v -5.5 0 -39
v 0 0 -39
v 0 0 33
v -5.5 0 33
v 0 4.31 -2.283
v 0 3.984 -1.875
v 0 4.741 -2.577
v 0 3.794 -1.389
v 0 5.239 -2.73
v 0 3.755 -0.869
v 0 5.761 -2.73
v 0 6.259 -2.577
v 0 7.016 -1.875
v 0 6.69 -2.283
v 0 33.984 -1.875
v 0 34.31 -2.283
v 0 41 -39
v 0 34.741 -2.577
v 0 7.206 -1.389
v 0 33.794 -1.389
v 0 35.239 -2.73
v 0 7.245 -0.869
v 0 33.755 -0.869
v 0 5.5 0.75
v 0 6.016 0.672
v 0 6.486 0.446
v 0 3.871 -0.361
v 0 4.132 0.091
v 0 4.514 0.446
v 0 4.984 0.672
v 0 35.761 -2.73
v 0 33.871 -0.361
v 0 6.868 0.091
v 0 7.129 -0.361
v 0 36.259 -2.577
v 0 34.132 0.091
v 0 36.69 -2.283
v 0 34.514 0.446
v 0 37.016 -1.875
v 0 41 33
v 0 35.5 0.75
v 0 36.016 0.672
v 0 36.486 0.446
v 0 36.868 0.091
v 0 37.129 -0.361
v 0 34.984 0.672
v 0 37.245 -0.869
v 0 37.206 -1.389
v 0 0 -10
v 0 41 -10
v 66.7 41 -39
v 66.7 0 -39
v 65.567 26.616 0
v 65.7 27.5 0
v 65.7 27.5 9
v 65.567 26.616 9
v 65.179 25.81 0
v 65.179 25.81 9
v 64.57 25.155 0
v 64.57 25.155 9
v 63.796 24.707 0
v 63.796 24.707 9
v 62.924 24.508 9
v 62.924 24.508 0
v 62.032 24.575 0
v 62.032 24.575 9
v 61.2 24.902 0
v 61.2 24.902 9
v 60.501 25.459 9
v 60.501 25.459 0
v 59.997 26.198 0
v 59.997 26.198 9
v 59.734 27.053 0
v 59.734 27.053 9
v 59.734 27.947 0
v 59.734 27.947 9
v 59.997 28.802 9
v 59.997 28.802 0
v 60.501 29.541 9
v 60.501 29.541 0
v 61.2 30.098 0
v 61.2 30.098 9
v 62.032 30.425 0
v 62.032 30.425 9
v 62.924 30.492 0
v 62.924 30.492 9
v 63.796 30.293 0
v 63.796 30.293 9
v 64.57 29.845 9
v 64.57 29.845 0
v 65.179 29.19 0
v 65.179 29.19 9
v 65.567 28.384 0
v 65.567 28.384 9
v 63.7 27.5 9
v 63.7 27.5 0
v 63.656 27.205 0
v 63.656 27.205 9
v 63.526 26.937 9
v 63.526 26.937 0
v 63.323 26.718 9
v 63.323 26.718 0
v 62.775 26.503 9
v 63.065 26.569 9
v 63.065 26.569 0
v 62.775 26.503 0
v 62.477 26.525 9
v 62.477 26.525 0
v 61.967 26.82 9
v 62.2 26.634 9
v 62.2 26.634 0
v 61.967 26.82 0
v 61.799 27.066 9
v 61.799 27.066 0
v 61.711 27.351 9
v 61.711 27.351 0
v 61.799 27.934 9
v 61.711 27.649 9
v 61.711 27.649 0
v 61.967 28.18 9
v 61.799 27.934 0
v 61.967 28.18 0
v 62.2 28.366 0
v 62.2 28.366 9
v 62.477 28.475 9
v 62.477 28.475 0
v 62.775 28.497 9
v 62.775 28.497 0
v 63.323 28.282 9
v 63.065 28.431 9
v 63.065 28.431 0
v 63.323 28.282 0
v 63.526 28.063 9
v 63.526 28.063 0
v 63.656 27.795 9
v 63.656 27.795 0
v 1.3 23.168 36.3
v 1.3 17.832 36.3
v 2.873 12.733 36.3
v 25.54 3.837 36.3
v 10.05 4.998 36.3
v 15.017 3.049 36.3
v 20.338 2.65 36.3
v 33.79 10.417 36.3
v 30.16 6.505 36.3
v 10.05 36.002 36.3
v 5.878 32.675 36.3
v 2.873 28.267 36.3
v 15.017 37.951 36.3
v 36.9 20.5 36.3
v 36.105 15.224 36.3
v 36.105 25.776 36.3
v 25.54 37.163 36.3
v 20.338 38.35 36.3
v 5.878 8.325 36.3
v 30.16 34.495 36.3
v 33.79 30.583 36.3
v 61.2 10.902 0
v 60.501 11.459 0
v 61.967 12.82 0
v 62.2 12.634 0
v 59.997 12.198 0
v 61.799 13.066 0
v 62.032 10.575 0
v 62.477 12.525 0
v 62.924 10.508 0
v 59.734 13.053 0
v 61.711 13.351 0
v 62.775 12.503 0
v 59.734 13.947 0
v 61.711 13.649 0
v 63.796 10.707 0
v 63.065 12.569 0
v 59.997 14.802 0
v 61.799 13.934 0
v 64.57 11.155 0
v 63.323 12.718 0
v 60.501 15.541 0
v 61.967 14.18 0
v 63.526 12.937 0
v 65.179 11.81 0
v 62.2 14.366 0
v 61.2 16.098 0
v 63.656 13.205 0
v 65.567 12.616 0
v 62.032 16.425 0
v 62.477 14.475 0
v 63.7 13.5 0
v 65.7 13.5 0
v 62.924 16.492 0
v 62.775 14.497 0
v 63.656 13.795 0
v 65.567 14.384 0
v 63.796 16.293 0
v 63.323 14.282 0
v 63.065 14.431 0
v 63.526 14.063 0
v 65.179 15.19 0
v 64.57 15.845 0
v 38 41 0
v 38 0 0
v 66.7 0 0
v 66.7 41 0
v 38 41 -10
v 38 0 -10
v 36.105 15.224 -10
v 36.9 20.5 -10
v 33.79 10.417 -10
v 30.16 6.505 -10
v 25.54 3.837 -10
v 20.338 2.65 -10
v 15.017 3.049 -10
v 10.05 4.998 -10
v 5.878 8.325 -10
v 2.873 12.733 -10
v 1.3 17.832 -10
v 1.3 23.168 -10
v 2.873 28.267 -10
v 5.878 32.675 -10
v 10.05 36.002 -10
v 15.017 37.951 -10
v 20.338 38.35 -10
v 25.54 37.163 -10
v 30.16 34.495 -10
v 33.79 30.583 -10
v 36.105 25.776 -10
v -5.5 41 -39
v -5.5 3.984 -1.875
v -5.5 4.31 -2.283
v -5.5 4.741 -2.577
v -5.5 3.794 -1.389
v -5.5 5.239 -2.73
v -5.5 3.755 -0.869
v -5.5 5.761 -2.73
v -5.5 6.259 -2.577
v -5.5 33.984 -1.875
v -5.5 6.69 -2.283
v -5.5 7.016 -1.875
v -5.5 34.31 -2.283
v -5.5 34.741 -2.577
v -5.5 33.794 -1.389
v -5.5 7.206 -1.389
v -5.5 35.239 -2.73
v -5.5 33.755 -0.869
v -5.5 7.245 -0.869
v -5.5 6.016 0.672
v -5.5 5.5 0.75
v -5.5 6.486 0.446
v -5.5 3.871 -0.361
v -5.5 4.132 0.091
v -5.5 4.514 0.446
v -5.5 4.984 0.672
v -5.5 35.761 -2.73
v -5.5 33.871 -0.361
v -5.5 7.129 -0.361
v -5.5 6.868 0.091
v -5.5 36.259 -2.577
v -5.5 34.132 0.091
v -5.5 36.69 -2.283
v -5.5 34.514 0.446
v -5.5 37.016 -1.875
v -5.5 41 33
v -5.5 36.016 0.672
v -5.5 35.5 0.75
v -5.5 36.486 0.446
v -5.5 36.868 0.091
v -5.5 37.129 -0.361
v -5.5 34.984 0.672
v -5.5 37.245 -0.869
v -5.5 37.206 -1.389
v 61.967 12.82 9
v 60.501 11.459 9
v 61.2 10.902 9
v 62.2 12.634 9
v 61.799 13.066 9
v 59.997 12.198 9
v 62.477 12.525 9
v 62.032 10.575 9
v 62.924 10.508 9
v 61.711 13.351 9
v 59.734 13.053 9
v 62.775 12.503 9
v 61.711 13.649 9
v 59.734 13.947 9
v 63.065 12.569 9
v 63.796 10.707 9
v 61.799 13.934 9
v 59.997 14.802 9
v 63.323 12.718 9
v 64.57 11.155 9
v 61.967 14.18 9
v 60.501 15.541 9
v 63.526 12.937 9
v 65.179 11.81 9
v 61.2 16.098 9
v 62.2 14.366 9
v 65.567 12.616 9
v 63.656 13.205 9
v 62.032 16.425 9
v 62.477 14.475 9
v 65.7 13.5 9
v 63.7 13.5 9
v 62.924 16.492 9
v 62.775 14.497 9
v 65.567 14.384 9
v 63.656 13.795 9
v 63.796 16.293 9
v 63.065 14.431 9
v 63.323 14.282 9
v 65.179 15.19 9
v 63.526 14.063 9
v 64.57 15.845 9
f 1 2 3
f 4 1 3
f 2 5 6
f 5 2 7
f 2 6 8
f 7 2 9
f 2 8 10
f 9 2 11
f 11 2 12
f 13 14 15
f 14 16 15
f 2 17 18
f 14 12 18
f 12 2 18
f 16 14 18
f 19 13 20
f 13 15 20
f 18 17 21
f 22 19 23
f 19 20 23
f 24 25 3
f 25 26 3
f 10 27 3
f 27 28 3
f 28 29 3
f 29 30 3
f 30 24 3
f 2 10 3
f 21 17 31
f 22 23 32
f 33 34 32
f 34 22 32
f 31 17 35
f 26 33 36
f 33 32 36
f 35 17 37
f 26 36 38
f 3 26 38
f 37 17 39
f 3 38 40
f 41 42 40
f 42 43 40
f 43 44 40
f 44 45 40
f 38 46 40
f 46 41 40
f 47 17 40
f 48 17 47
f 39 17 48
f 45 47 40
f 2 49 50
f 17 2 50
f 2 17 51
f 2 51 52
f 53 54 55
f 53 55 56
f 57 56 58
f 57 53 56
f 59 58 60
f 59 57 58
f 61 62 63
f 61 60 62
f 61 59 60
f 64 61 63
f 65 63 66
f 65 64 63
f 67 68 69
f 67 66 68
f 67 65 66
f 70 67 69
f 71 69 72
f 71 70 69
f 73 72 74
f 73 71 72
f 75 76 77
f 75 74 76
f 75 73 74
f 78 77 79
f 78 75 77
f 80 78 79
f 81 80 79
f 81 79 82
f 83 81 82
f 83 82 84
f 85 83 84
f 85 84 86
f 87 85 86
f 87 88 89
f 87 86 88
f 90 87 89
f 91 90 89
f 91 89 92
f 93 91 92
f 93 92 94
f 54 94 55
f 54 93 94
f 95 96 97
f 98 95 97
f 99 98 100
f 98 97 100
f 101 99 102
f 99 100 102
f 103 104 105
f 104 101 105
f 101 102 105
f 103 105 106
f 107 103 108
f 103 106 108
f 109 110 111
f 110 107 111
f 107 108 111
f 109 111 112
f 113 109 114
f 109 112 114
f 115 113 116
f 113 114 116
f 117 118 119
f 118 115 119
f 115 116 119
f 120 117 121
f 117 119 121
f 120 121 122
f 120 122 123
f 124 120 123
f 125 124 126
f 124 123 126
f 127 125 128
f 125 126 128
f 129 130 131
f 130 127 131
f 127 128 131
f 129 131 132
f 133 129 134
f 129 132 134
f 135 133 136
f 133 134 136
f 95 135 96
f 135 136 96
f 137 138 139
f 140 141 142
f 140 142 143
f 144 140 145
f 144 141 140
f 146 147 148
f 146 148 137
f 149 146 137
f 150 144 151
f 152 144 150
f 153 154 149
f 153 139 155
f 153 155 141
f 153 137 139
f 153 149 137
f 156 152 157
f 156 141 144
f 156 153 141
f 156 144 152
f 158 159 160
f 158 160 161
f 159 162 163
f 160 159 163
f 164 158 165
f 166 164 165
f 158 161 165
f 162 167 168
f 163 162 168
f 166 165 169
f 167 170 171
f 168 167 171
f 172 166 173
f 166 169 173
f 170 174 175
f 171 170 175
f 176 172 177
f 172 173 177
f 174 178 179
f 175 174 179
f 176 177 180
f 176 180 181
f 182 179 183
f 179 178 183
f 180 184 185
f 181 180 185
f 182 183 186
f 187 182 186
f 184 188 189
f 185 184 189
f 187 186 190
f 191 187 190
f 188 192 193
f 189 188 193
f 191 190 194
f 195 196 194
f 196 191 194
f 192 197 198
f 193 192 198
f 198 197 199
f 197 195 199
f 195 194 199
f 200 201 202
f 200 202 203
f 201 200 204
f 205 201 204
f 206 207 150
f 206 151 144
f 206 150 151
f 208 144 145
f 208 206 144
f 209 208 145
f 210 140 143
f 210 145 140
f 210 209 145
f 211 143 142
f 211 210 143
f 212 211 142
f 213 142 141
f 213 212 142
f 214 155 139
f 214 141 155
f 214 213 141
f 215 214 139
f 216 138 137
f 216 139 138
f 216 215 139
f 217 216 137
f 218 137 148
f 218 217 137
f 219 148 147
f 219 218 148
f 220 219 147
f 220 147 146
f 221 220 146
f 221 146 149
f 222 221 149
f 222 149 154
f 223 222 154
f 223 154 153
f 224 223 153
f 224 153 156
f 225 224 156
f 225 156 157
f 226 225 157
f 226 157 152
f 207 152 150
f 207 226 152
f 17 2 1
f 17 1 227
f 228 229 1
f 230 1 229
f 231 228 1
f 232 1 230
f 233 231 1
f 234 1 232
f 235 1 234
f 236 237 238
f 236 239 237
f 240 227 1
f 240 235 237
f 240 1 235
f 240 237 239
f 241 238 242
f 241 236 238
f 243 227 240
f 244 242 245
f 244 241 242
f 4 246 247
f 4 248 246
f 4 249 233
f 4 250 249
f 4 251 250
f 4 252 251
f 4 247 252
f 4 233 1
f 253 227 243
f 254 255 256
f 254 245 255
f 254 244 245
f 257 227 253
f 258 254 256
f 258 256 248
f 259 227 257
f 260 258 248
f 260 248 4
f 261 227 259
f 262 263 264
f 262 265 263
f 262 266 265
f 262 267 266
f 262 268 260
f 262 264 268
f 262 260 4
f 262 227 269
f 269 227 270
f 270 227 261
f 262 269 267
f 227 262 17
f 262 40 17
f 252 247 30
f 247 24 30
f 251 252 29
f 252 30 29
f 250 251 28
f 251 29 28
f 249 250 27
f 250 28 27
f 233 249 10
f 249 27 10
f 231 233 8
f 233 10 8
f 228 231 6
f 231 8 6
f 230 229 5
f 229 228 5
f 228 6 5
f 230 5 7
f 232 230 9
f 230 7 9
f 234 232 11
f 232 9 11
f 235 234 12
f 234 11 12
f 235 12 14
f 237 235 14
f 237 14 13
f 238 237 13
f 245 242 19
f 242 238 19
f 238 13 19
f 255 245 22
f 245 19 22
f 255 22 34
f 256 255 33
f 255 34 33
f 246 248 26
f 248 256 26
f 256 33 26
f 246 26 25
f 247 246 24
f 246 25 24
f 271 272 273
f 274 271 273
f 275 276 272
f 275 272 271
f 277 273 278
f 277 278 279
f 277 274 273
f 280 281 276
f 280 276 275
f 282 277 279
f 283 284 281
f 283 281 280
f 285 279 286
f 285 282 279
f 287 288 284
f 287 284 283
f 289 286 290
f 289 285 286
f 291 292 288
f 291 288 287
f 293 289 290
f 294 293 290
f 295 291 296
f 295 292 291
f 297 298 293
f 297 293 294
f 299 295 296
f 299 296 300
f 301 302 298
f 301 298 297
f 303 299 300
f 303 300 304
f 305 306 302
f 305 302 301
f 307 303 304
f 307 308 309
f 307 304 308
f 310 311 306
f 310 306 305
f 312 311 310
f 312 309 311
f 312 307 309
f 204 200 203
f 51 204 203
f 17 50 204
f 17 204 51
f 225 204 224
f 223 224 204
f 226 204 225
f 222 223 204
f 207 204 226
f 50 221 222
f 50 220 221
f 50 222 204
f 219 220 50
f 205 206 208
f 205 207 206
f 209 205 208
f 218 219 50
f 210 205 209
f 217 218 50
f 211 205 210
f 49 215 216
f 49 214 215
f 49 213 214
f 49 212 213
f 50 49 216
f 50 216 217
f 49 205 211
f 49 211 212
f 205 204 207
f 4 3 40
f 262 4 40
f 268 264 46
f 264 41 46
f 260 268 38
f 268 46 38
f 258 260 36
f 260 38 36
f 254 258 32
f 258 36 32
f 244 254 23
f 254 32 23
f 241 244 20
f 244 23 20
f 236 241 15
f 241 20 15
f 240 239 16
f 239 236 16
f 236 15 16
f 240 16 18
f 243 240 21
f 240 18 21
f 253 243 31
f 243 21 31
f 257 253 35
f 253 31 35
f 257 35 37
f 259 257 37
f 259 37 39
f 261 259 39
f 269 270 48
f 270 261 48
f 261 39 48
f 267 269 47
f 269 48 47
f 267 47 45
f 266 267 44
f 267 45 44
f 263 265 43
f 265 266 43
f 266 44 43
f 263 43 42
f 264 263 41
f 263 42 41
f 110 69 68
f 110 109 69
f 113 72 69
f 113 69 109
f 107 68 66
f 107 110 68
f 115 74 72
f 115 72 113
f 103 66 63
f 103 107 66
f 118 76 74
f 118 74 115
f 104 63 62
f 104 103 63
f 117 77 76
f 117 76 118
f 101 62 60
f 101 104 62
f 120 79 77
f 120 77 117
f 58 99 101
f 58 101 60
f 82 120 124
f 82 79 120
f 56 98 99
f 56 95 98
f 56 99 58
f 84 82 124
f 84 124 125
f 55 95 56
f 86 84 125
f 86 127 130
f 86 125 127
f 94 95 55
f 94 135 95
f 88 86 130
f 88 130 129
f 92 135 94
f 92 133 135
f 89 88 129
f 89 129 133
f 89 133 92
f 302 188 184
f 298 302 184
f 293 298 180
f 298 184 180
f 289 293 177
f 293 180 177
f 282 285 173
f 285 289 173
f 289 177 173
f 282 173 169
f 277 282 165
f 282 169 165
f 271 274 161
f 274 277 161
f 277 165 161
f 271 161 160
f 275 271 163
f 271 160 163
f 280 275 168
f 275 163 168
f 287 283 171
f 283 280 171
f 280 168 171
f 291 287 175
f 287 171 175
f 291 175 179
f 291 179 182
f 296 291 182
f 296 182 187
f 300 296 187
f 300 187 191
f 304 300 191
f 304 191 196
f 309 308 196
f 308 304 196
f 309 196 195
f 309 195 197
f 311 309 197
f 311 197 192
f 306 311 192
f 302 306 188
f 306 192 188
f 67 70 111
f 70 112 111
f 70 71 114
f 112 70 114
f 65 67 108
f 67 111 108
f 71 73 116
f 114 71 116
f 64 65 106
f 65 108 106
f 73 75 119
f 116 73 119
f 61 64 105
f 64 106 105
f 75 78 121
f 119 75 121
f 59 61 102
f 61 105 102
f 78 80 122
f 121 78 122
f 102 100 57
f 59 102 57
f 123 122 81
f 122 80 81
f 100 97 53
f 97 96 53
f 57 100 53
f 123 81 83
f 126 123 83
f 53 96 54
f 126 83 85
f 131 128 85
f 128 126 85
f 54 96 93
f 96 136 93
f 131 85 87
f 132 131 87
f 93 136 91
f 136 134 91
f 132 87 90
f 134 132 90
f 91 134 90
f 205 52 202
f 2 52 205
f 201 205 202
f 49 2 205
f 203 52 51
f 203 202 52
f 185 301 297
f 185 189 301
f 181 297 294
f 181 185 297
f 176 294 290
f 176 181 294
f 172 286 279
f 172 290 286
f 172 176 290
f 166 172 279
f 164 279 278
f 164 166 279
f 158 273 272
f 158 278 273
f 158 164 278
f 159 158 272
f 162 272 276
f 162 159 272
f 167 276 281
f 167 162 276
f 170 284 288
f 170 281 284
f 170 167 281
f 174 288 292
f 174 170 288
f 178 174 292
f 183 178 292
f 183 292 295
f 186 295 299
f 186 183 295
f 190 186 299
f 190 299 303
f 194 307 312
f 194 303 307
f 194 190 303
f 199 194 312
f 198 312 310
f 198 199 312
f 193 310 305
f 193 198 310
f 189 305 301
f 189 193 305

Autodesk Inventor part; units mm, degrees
ref_plane "YZ Plane" through (0, 0, 0) normal (1, 0, 0) x (0, 1, 0)
ref_plane "XZ Plane" through (0, 0, 0) normal (0, 1, 0) x (-1, 0, 0)
ref_plane "XY Plane" through (0, 0, 0) normal (0, 0, 1) x (1, 0, 0)
sketch "スケッチ1" plane through (0, 0, 0) normal (1, 0, 0) x (0, 1, 0)
  line L0 (0, 0) -> (41, 0)
  line L1 (41, 0) -> (41, -39)
  line L2 (41, -39) -> (0, -39)
  line L3 (0, -39) -> (0, 0)
  dimension "d0" = 41
  dimension "d1" = 39
extrude "押し出し1" add sketch "スケッチ1" along normal blind 66.7
sketch "スケッチ2" plane through (0, 0, -39) normal (0, -1, 0) x (1, 0, 0)
  line L0 (0, 39) -> (38, 39)
  line L1 (38, 39) -> (38, 29)
  line L2 (38, 29) -> (0, 29)
  line L3 (0, 29) -> (0, 39)
  dimension "d4" = 38
  dimension "d5" = 10
extrude "押し出し2" cut sketch "スケッチ2" against normal through all
sketch "スケッチ3" plane through (0, 0, -10) normal (0, 0, 1) x (1, 0, 0)
  line L0 (0, 0) -> (0, 41) projected
  line L1 (38, 0) -> (0, 0) projected
  circle A0 centre (19, 20.5) radius 17.9
  dimension "d22" = 0
  dimension "d8" = 19
  dimension "d9" = 20.5
  dimension "d10" = 35.8
extrude "押し出し3" add sketch "スケッチ3" along normal blind 46.3
sketch "スケッチ4" plane through (0, 0, 0) normal (-1, 0, 0) x (0, 0, 1)
  circle A0 centre (-1, 5.5) radius 1.75
  circle A1 centre (-1, 35.5) radius 1.75
  line L0 (-39, 0) -> (-39, 41) projected
  line L1 (-39, 0) -> (33, 0)
  line L2 (33, 0) -> (33, 41)
  line L3 (33, 41) -> (-39, 41)
  line L4 (-39, 41) -> (-39, 0)
  point P0 (0, 0)
  dimension "d13" = 3.5
  dimension "d14" = 3.5
  dimension "d15" = 30
  dimension "d16" = 5.5
  dimension "d17" = 0
  dimension "d18" = 38
  dimension "d19" = 41
  dimension "d20" = 72
extrude "押し出し4" add sketch "スケッチ4" along normal blind 5.5 separate body
sketch "スケッチ5" plane through (66.7, 0, 0) normal (0, 0, 1) x (1, 0, 0)
  circle A0 centre (-4, 27.5) radius 3
  circle A1 centre (-4, 13.5) radius 3
  line L0 (-72.2, 0) -> (-72.2, 41) projected
  line L1 (-28.7, 41) -> (0, 41) projected
  circle A2 centre (-4, 27.5) radius 1
  circle A3 centre (-4, 13.5) radius 1
  point P0 (-66.7, 0)
  dimension "d23" = 6
  dimension "d24" = 6
  dimension "d25" = 68.2
  dimension "d26" = 68.2
  dimension "d27" = 14
  dimension "d28" = 13.5
  dimension "d29" = 2
  dimension "d30" = 2
extrude "押し出し5" add sketch "スケッチ5" along normal blind 9 separate body
equation "\"d26\" = d25"
properties part number "DP0110-Y1" material "アルミニウム 6061"
